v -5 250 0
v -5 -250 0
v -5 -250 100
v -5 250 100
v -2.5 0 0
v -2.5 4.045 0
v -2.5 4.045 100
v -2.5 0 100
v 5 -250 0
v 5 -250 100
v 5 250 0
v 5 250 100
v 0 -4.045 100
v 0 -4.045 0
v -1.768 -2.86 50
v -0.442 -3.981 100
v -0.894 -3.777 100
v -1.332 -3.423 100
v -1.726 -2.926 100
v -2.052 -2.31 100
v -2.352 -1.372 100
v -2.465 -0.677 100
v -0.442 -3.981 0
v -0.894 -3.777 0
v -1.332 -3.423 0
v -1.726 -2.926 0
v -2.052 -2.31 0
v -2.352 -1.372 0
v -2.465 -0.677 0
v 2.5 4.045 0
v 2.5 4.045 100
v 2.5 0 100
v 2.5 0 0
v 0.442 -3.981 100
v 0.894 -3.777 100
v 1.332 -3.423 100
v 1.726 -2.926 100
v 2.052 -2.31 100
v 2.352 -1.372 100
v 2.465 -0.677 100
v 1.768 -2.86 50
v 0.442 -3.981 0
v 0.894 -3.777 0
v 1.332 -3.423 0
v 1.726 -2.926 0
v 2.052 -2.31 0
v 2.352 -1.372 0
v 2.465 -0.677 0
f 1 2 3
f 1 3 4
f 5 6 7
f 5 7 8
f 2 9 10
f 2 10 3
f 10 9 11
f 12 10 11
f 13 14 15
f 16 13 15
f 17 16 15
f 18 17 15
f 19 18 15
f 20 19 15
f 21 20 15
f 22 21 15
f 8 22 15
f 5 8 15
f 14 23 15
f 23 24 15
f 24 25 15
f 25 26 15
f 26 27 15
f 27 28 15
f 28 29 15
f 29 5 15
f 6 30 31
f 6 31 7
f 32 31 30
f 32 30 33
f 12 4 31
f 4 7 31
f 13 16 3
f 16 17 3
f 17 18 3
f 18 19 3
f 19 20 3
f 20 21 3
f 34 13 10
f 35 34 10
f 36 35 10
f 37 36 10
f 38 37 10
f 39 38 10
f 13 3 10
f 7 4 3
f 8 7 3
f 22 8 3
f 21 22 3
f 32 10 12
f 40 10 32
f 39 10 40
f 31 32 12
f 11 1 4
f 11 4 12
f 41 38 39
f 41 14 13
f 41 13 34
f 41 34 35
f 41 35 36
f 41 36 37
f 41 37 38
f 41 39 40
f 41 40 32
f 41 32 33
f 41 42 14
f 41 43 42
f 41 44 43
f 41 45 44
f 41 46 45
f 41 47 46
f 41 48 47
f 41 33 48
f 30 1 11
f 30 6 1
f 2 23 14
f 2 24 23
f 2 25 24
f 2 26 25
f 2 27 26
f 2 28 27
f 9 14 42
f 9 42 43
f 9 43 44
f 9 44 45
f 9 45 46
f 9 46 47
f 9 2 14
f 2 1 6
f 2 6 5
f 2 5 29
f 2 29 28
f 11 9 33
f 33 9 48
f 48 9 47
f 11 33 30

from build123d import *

# Parameters (mm, degrees)
F2_DEPTH = 100
F6_ANGLE = 180


with BuildPart() as f2:
    # F1 (on Top) → F2 (new body)
    with BuildSketch(Plane.XY):
        with BuildLine():
            Line((5, 4.045), (5, 250))
            Line((5, 250), (0, 250))
            Line((0, 250), (0, -250))
            Line((0, -250), (5, -250))
            Line((5, -250), (5, -4.045))
            Line((5, -4.045), (2.5, -4.045))
            Line((2.5, -4.045), (2.5, 0))
            add(Edge.make_bspline(
                [(5, 4.045), (2.5, 4.045), (2.5, 0)],
                knots=[0, 0, 0, 1.5707963268, 1.5707963268, 1.5707963268], degree=2, weights=[1, 0.7071067812, 1]))
        make_face()
    extrude(amount=F2_DEPTH)


with BuildPart() as f2_1:
    # F4: moved
    add(f2.part.moved(Location((-5, 0, 0))))

    # F5: F2 across plane


with BuildPart() as f2_2:
    add(f2_1.part)
    add(f2_1.part.mirror(Plane.YZ))


with BuildPart() as f2_3:
    # F6: moved
    add(f2_2.part.rotate(Axis((5, -250, 50), (0, 0, -1)), F6_ANGLE))


with BuildPart() as f2_4:
    # F9: moved
    add(f2_3.part.moved(Location((-10, 500, 0))))


solid = f2_4.part
